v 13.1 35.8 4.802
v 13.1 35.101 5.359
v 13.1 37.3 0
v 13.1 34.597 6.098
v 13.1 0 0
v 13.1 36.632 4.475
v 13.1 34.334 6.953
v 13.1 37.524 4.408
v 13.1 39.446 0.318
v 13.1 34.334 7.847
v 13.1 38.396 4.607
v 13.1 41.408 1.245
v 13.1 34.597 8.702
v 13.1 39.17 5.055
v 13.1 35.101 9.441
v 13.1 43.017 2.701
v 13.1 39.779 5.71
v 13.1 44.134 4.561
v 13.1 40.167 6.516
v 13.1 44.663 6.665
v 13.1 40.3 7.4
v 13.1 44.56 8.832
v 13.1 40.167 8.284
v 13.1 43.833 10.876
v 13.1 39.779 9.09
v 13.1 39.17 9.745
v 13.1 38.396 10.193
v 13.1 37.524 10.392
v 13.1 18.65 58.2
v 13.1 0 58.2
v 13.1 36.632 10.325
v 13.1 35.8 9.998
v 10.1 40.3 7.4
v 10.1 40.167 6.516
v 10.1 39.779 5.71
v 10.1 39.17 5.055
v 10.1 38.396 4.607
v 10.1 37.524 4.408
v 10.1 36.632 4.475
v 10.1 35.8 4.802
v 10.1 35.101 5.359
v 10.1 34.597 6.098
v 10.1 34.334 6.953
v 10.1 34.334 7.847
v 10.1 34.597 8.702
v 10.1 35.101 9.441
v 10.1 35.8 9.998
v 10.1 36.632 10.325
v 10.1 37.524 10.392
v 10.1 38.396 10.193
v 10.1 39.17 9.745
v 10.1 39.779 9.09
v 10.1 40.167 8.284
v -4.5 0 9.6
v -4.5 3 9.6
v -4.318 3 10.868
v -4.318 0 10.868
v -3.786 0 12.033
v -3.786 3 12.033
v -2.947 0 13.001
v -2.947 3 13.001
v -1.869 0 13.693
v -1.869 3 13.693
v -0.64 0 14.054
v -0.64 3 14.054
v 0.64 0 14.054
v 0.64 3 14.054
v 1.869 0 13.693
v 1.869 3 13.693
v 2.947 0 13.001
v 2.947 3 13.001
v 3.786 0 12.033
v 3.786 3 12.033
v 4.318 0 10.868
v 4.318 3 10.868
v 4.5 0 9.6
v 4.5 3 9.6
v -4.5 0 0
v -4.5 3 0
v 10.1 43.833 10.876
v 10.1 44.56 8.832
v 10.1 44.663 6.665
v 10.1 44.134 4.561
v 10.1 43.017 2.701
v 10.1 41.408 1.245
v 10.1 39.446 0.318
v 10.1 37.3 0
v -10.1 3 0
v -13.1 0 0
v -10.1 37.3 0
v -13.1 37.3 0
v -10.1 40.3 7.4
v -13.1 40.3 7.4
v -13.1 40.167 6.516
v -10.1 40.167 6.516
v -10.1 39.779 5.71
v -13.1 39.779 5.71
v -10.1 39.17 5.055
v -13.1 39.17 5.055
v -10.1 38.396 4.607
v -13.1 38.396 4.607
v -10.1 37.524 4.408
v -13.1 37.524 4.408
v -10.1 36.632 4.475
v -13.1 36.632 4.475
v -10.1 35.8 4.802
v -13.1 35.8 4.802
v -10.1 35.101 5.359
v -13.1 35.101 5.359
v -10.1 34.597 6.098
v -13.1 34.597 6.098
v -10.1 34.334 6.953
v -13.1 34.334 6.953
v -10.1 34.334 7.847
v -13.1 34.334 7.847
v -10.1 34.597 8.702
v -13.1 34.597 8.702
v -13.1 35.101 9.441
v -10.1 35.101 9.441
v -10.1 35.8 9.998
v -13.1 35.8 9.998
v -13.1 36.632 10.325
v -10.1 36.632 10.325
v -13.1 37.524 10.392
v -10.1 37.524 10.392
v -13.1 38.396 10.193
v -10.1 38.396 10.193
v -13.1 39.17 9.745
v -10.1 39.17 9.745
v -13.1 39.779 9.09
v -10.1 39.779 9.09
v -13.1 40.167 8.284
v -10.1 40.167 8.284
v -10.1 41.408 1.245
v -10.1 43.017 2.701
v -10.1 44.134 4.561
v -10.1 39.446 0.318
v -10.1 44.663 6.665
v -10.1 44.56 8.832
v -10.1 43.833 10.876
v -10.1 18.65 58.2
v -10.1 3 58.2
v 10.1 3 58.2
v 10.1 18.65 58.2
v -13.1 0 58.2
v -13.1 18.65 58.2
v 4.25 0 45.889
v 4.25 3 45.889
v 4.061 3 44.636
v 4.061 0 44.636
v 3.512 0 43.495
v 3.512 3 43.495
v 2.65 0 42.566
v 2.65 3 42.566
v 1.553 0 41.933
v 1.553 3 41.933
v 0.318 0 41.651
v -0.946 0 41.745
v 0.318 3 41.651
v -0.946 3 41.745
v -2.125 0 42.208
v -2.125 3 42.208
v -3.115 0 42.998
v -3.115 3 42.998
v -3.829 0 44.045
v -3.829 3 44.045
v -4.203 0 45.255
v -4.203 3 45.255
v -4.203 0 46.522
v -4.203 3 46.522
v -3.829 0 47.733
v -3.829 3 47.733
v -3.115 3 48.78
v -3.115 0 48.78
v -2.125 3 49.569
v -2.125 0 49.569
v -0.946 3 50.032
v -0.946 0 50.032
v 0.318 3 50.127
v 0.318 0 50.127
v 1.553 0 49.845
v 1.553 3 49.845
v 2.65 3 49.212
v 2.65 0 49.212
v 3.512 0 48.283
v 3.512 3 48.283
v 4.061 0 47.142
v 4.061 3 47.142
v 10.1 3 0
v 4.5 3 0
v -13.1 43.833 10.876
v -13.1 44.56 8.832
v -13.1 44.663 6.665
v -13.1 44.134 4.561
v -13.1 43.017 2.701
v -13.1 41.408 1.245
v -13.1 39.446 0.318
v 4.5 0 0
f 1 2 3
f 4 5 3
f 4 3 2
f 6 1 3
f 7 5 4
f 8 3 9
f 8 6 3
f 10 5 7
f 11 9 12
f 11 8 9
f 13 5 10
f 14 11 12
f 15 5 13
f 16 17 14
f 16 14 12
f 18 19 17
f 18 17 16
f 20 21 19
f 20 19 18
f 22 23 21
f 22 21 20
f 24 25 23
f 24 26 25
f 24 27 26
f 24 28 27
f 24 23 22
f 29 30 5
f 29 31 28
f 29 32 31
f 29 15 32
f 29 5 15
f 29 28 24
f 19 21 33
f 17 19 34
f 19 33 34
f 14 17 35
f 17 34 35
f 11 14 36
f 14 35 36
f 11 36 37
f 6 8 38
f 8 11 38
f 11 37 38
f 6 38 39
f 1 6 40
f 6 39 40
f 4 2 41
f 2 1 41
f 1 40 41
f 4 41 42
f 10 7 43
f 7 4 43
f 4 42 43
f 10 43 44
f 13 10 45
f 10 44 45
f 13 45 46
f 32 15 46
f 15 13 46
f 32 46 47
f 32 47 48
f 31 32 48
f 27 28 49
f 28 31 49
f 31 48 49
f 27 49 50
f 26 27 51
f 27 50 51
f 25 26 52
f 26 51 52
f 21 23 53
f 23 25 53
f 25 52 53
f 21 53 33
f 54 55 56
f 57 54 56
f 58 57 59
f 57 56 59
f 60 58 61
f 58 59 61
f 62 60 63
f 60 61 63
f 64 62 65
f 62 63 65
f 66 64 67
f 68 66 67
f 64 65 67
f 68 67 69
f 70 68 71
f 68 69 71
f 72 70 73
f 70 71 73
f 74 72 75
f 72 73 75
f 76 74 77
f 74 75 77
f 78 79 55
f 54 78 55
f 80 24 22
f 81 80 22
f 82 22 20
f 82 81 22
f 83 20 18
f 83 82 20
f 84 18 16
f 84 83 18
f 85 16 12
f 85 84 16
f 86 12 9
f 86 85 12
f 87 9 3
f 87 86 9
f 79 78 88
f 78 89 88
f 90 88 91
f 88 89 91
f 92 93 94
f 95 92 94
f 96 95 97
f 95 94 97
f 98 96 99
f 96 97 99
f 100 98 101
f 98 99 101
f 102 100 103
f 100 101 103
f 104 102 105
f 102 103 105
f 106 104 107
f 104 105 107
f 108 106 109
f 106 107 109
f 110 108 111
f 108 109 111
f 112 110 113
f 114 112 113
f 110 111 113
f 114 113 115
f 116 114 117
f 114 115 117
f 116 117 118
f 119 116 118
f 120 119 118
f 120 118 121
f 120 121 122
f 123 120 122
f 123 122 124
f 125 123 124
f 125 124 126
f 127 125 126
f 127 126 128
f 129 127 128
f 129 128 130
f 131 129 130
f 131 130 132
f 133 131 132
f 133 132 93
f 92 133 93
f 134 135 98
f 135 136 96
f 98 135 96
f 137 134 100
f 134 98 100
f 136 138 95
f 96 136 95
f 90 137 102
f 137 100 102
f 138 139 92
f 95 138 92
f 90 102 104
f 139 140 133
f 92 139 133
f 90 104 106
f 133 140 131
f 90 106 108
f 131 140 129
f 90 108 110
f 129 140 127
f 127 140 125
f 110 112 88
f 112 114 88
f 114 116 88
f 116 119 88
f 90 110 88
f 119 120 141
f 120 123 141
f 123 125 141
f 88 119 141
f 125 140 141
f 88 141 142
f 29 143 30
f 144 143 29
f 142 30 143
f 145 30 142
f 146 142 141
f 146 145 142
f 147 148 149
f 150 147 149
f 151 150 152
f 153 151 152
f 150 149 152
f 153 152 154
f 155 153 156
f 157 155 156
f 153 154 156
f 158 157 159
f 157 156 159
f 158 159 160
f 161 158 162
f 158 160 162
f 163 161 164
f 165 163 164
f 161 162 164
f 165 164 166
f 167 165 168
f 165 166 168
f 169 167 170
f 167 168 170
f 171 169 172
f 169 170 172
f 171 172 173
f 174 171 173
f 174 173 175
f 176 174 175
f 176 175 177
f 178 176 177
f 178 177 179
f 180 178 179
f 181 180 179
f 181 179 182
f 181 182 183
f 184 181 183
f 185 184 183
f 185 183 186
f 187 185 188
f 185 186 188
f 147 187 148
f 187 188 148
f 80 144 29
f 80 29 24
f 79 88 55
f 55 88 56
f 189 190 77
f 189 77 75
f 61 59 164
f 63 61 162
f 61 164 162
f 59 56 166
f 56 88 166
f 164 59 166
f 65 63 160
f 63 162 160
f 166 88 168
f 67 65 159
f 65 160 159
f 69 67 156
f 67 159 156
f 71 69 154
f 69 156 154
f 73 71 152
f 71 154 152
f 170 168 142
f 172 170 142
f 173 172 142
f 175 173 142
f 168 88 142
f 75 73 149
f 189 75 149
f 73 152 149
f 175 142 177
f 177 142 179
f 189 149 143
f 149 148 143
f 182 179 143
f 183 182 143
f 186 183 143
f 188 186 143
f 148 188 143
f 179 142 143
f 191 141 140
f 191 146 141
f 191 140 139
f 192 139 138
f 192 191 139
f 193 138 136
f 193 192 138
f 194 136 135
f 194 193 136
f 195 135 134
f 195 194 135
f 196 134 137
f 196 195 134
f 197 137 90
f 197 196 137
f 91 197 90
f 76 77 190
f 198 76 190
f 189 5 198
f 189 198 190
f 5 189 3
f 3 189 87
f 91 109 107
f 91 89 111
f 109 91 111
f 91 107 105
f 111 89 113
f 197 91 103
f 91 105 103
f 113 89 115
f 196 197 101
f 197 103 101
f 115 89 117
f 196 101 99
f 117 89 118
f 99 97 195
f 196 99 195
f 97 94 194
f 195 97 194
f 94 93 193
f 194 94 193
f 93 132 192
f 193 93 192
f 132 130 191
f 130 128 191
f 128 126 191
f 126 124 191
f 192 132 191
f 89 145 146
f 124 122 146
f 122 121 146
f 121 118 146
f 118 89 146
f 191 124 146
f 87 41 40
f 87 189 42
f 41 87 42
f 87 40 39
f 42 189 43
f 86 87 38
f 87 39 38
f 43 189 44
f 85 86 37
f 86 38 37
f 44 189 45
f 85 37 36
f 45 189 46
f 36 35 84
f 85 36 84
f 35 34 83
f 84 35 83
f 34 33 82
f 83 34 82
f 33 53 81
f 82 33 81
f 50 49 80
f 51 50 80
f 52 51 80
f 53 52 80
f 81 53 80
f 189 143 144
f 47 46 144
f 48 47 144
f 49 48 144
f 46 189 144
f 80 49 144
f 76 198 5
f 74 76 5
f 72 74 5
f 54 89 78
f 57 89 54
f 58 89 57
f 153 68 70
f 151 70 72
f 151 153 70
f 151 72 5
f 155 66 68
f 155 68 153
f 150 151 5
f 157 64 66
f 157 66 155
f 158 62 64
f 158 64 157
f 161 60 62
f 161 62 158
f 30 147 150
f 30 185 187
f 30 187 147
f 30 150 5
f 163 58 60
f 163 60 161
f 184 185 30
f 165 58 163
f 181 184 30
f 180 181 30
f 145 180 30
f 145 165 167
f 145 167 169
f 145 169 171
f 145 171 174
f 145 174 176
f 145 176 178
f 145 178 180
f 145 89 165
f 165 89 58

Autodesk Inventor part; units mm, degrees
ref_plane "YZ Plane" through (0, 0, 0) normal (1, 0, 0) x (0, 1, 0)
ref_plane "XZ Plane" through (0, 0, 0) normal (0, 1, 0) x (-1, 0, 0)
ref_plane "XY Plane" through (0, 0, 0) normal (0, 0, 1) x (1, 0, 0)
sketch "스케치1" plane through (0, 0, 0) normal (1, 0, 0) x (0, 1, 0)
  line L0 (0, 0) -> (0, 58.2)
  line L1 (0, 58.2) -> (18.65, 58.2)
  line L2 (0, 0) -> (37.3, 0)
  circle A0 centre (37.3, 7.4) radius 7.4
  circle A1 centre (37.3, 7.4) radius 3
  line L3 (18.65, 58.2) -> (43.8327, 10.8763)
  dimension "d3" = 14.8
  dimension "d0" = 58.2
  dimension "d1" = 37.3
  dimension "d2" = 18.65
  dimension "d4" = 0
  dimension "d5" = 6
extrude "돌출1" add sketch "스케치1" along normal mid plane 26.2
sketch "스케치2" plane through (-13.1, 0, 58.2) normal (0, 0, 1) x (1, 0, 0)
  line L0 (3, 3) -> (23.2, 3)
  line L1 (23.2, 3) -> (23.2, 55.8283)
  line L2 (23.2, 55.8283) -> (3, 55.8283)
  line L3 (3, 55.8283) -> (3, 3)
  line L4 (26.2, 43.8327) -> (26.2, 18.65) projected
  line L5 (26.2, 0) -> (0, 0) projected
  line L6 (0, 18.65) -> (0, 43.8327) projected
  point P0 (13.1, 0)
  dimension "d8" = 3
  dimension "d9" = 3
  dimension "d10" = 3
extrude "돌출2" cut sketch "스케치2" against normal through all
sketch "스케치3" plane through (-10.1, 3, 58.2) normal (0, 1, 0) x (1, 0, 0)
  circle A0 centre (10.1, 48.6) radius 4.5
  line L0 (0, 58.2) -> (20.2, 58.2) projected
  line L1 (14.6, 58.2) -> (5.6, 58.2)
  line L2 (5.6, 58.2) -> (5.6, 48.6)
  line L3 (5.6, 48.6) -> (14.6, 48.6)
  line L4 (14.6, 48.6) -> (14.6, 58.2)
  circle A1 centre (10.1, 12.3112) radius 4.25
  point P0 (10.1, 58.2)
  point P1 (10.1, 58.2)
  point P2 (10.1, 48.6)
  point P3 (10.1, 58.2)
  point P4 (14.6, 48.6)
  dimension "d13" = 9
  dimension "d14" = 9
  dimension "d15" = 9.6
  dimension "d16" = 0
  dimension "d17" = 8.5
  dimension "d18" = 0
extrude "돌출3" cut sketch "스케치3" against normal through all
equation "\"d2\" = 0.5 * d1"
properties part number "높이액추브라켓"
